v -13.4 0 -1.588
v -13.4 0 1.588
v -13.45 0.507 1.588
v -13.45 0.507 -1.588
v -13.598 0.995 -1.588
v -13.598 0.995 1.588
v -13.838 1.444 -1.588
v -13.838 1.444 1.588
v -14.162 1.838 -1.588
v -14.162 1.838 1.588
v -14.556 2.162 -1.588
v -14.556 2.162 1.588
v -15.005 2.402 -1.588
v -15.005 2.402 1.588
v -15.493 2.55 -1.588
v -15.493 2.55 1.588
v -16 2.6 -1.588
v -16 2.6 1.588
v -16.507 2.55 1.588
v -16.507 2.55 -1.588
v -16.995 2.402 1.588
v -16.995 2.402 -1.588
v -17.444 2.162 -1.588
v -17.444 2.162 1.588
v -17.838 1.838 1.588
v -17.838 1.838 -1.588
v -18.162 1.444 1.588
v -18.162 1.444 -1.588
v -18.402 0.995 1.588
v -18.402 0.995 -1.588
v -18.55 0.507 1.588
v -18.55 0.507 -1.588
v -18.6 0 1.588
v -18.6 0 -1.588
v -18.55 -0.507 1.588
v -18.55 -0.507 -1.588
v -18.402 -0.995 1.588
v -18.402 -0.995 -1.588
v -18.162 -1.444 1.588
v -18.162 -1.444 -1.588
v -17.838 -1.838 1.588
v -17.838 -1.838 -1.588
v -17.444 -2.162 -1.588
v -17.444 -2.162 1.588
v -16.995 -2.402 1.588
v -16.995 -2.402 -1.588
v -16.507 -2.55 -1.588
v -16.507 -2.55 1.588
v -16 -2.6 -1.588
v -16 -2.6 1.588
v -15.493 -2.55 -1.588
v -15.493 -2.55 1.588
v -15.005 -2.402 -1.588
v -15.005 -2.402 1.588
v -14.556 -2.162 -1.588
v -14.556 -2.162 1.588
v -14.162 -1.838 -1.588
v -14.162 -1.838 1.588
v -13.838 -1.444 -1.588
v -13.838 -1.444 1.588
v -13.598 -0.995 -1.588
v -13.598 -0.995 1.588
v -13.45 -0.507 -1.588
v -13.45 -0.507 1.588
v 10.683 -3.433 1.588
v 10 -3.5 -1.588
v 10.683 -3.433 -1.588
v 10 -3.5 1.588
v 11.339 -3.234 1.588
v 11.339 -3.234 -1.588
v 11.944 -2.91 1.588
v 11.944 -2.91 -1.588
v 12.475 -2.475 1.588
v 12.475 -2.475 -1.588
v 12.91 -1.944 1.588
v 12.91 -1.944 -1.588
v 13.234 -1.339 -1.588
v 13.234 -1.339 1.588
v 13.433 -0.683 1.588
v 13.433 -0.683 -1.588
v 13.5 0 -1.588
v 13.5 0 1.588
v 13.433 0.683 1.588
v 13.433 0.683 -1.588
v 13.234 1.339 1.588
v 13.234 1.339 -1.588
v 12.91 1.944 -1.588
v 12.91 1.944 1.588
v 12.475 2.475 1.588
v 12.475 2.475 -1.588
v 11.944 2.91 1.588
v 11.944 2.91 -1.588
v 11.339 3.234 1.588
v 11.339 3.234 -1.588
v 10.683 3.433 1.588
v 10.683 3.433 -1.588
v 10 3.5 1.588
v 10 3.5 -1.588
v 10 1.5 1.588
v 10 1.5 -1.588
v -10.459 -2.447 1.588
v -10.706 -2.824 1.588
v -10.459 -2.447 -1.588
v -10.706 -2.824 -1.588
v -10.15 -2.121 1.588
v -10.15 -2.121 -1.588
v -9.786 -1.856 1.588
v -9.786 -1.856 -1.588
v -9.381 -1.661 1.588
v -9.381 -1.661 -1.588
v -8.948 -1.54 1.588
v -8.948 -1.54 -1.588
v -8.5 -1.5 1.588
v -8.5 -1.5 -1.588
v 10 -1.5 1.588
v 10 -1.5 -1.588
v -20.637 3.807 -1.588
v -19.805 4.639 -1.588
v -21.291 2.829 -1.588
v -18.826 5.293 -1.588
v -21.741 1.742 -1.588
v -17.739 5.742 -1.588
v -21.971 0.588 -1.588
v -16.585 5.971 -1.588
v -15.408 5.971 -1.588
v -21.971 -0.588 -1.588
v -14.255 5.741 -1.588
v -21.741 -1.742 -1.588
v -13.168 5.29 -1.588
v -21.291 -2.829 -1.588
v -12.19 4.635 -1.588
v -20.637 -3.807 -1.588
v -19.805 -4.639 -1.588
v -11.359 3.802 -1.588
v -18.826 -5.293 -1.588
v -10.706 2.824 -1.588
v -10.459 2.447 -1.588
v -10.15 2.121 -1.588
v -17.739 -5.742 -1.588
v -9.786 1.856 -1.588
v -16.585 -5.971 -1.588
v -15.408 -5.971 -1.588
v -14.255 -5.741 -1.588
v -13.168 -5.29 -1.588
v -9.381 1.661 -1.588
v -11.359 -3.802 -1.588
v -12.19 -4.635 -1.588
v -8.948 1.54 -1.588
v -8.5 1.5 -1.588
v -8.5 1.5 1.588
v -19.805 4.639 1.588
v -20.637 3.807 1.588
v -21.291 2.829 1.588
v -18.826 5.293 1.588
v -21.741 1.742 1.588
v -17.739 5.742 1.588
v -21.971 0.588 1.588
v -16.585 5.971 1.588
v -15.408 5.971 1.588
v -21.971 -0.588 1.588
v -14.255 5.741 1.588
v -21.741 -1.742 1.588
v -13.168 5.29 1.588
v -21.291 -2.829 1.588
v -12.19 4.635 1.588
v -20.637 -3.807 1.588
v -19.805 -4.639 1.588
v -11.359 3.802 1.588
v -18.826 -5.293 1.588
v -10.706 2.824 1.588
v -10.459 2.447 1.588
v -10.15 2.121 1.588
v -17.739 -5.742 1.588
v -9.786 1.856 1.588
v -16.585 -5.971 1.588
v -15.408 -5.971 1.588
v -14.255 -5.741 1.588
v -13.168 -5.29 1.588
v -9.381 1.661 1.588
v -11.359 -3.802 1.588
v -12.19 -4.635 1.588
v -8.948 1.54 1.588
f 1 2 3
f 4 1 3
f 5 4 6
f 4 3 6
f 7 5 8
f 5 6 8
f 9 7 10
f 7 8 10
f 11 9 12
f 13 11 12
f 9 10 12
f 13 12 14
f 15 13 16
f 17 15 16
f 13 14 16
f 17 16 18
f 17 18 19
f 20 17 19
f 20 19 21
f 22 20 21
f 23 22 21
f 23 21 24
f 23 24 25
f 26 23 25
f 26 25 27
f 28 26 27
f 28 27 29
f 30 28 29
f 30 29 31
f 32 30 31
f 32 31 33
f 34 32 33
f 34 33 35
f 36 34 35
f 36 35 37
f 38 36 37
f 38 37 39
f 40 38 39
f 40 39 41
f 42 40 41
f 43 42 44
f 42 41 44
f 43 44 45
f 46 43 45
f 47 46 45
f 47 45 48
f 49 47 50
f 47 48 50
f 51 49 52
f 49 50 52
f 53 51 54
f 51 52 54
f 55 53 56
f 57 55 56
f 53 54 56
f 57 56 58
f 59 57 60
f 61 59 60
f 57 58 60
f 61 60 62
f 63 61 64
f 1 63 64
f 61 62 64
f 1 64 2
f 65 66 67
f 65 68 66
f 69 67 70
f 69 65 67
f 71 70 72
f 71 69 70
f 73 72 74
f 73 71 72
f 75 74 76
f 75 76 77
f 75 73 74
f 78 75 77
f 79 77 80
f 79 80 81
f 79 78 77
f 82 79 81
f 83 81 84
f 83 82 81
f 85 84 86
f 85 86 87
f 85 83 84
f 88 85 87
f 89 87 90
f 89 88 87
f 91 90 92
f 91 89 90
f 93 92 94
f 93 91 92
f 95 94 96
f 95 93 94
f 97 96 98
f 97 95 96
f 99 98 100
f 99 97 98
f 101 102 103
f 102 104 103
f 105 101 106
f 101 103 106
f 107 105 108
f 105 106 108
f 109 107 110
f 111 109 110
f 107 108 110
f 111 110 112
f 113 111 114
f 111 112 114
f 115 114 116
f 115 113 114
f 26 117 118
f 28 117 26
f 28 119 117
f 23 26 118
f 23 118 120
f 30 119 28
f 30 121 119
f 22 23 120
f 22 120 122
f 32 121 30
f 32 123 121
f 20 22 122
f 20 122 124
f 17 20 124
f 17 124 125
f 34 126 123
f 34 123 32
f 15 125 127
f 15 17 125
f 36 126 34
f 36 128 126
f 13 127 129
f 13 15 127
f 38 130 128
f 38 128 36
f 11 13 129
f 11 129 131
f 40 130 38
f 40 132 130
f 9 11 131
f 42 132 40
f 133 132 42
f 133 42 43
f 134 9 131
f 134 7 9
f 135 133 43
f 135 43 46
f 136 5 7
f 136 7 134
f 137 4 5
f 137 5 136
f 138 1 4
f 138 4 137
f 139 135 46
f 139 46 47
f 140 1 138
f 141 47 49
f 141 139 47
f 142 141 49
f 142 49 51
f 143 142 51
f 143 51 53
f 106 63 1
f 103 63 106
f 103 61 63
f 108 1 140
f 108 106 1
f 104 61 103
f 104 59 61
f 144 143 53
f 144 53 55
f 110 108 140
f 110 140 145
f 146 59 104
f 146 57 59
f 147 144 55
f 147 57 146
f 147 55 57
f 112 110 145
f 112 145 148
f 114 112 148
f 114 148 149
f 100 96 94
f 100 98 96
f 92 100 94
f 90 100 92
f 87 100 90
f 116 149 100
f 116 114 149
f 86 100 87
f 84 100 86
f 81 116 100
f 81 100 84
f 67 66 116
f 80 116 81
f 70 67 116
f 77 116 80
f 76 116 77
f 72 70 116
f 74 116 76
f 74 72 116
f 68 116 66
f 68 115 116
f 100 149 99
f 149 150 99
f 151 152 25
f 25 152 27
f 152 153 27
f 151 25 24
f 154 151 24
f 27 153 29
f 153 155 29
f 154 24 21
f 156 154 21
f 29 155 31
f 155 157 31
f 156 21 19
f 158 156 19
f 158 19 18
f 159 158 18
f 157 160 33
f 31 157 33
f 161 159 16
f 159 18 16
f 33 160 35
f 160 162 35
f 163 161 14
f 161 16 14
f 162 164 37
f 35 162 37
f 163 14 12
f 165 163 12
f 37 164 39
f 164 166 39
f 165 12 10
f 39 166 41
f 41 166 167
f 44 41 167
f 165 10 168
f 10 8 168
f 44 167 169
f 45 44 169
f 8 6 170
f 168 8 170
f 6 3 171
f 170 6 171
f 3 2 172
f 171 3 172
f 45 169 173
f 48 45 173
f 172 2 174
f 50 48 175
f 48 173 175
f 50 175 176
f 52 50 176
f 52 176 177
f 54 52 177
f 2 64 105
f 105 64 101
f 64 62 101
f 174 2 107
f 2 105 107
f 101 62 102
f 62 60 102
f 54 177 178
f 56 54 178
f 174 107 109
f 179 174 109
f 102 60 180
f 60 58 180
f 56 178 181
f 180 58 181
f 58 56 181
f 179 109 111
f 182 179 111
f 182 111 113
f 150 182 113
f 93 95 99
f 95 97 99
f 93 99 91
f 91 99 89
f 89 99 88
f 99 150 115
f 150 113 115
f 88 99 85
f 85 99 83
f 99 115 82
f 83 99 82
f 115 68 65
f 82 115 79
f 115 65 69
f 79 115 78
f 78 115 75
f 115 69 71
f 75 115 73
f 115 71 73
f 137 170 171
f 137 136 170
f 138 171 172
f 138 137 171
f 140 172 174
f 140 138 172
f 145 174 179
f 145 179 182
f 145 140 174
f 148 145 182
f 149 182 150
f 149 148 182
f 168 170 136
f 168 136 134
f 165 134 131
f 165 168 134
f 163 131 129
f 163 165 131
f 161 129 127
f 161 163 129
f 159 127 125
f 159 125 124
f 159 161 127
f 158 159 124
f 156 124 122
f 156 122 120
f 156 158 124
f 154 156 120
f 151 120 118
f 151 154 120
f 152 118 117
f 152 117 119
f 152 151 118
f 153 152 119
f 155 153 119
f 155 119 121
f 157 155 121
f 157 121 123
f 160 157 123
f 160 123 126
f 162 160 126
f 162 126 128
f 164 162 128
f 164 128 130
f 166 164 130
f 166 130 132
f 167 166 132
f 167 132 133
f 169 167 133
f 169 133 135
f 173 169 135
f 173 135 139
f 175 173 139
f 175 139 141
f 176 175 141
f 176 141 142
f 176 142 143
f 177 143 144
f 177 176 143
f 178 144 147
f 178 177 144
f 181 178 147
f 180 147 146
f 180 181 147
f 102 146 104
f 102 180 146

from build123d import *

# Parameters (mm, degrees)
BOSS_EXTRUDE1_DEPTH = 1.5875
SKETCH3_R           = 6
BOSS_EXTRUDE2_DEPTH = 3.175
SKETCH4_R           = 2.6
CUT_EXTRUDE1_DEPTH  = 24.023479863
BOSS_EXTRUDE3_DEPTH = 3.175
FILLET1_R           = 2.5


with BuildPart() as part:
    # Sketch2 → Boss-Extrude1 (new, symmetric)
    with BuildSketch(Plane.XY):
        with BuildLine():
            ThreePointArc((10, -3.5), (13.5, 0), (10, 3.5))
            Line((10, 3.5), (10, 1.5))
            Line((10, 1.5), (-10, 1.5))
            Line((-10, 1.5), (-10, -1.5))
            Line((-10, -1.5), (10, -1.5))
            Line((10, -1.5), (10, -3.5))
        make_face()
    extrude(amount=BOSS_EXTRUDE1_DEPTH, both=True)



with BuildPart() as body_2:
    # Sketch3 → Boss-Extrude2 (new body)
    with BuildSketch(Plane.XY.offset(1.5875)):
        with Locations((-16, 0)):
            Circle(SKETCH3_R)
    extrude(amount=-BOSS_EXTRUDE2_DEPTH)

    # Sketch4 → Cut-Extrude1 (cut, through all)
    with BuildSketch(Plane.XY.offset(1.5875)):
        with Locations((-16, 0)):
            Circle(SKETCH4_R)
    extrude(amount=-CUT_EXTRUDE1_DEPTH, mode=Mode.SUBTRACT)


with BuildPart() as part_1:
    add(part.part)

    add(body_2.part)  # Boss-Extrude3 merges body 2
    # Sketch6 → Boss-Extrude3 (add)
    with BuildSketch(Plane.XY.offset(1.5875)):
        Polygon((-10, -1.5), (-10, 0), (-10.190524981, -1.5), align=None)
    boss_extrude3 = extrude(amount=-BOSS_EXTRUDE3_DEPTH)

    # Mirror1: Boss-Extrude3 across plane
    add(boss_extrude3.mirror(Plane.ZX))

    # Fillet1
    fillet1_edges = [part_1.edges().sort_by_distance(p)[0] for p in [
        (-10.190524981, -1.5, 0),
        (-10.190524981, 1.5, 0),
    ]]
    fillet(fillet1_edges, radius=FILLET1_R)


solid = part_1.part
